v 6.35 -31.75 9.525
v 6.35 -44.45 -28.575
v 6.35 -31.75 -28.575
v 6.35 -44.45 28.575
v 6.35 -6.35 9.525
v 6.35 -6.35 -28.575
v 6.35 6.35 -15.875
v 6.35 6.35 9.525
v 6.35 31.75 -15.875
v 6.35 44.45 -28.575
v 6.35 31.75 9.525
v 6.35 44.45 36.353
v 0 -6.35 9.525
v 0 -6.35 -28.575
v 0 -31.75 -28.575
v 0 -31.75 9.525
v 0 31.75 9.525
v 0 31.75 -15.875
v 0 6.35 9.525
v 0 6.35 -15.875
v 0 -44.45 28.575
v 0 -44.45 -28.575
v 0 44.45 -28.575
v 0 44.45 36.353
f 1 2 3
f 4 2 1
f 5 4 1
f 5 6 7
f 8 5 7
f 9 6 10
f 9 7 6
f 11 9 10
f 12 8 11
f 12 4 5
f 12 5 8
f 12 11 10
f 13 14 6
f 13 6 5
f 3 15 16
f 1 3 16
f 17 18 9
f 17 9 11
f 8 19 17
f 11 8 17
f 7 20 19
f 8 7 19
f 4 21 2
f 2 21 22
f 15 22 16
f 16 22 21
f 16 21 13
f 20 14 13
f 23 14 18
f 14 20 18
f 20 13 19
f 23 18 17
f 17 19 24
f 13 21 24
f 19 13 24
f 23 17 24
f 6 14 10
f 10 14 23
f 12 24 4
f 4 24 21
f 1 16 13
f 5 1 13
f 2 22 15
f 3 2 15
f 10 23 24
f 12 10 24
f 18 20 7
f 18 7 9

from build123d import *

# Parameters (mm, degrees)
F1_DEPTH = 6.35
F2_W     = 25.4
F2_H     = 38.1
F2_H_2   = 25.4
F3_DEPTH = 6.351


with BuildPart() as f1:
    # F0 (on Right) → F1 (new body)
    with BuildSketch(Plane.YZ):
        Polygon((-44.45, 28.575), (-44.45, -28.575), (44.45, -28.575), (44.45, 28.575), (44.45, 36.352742), align=None)
    extrude(amount=F1_DEPTH)

    # F2 (on Right) → F3 (cut, through all)
    with BuildSketch(Plane.YZ):
        with Locations((-19.05, -9.525)):
            Rectangle(F2_W, F2_H)
        with Locations((19.05, -3.175)):
            Rectangle(F2_W, F2_H_2)
    extrude(amount=F3_DEPTH, mode=Mode.SUBTRACT)


solid = f1.part
